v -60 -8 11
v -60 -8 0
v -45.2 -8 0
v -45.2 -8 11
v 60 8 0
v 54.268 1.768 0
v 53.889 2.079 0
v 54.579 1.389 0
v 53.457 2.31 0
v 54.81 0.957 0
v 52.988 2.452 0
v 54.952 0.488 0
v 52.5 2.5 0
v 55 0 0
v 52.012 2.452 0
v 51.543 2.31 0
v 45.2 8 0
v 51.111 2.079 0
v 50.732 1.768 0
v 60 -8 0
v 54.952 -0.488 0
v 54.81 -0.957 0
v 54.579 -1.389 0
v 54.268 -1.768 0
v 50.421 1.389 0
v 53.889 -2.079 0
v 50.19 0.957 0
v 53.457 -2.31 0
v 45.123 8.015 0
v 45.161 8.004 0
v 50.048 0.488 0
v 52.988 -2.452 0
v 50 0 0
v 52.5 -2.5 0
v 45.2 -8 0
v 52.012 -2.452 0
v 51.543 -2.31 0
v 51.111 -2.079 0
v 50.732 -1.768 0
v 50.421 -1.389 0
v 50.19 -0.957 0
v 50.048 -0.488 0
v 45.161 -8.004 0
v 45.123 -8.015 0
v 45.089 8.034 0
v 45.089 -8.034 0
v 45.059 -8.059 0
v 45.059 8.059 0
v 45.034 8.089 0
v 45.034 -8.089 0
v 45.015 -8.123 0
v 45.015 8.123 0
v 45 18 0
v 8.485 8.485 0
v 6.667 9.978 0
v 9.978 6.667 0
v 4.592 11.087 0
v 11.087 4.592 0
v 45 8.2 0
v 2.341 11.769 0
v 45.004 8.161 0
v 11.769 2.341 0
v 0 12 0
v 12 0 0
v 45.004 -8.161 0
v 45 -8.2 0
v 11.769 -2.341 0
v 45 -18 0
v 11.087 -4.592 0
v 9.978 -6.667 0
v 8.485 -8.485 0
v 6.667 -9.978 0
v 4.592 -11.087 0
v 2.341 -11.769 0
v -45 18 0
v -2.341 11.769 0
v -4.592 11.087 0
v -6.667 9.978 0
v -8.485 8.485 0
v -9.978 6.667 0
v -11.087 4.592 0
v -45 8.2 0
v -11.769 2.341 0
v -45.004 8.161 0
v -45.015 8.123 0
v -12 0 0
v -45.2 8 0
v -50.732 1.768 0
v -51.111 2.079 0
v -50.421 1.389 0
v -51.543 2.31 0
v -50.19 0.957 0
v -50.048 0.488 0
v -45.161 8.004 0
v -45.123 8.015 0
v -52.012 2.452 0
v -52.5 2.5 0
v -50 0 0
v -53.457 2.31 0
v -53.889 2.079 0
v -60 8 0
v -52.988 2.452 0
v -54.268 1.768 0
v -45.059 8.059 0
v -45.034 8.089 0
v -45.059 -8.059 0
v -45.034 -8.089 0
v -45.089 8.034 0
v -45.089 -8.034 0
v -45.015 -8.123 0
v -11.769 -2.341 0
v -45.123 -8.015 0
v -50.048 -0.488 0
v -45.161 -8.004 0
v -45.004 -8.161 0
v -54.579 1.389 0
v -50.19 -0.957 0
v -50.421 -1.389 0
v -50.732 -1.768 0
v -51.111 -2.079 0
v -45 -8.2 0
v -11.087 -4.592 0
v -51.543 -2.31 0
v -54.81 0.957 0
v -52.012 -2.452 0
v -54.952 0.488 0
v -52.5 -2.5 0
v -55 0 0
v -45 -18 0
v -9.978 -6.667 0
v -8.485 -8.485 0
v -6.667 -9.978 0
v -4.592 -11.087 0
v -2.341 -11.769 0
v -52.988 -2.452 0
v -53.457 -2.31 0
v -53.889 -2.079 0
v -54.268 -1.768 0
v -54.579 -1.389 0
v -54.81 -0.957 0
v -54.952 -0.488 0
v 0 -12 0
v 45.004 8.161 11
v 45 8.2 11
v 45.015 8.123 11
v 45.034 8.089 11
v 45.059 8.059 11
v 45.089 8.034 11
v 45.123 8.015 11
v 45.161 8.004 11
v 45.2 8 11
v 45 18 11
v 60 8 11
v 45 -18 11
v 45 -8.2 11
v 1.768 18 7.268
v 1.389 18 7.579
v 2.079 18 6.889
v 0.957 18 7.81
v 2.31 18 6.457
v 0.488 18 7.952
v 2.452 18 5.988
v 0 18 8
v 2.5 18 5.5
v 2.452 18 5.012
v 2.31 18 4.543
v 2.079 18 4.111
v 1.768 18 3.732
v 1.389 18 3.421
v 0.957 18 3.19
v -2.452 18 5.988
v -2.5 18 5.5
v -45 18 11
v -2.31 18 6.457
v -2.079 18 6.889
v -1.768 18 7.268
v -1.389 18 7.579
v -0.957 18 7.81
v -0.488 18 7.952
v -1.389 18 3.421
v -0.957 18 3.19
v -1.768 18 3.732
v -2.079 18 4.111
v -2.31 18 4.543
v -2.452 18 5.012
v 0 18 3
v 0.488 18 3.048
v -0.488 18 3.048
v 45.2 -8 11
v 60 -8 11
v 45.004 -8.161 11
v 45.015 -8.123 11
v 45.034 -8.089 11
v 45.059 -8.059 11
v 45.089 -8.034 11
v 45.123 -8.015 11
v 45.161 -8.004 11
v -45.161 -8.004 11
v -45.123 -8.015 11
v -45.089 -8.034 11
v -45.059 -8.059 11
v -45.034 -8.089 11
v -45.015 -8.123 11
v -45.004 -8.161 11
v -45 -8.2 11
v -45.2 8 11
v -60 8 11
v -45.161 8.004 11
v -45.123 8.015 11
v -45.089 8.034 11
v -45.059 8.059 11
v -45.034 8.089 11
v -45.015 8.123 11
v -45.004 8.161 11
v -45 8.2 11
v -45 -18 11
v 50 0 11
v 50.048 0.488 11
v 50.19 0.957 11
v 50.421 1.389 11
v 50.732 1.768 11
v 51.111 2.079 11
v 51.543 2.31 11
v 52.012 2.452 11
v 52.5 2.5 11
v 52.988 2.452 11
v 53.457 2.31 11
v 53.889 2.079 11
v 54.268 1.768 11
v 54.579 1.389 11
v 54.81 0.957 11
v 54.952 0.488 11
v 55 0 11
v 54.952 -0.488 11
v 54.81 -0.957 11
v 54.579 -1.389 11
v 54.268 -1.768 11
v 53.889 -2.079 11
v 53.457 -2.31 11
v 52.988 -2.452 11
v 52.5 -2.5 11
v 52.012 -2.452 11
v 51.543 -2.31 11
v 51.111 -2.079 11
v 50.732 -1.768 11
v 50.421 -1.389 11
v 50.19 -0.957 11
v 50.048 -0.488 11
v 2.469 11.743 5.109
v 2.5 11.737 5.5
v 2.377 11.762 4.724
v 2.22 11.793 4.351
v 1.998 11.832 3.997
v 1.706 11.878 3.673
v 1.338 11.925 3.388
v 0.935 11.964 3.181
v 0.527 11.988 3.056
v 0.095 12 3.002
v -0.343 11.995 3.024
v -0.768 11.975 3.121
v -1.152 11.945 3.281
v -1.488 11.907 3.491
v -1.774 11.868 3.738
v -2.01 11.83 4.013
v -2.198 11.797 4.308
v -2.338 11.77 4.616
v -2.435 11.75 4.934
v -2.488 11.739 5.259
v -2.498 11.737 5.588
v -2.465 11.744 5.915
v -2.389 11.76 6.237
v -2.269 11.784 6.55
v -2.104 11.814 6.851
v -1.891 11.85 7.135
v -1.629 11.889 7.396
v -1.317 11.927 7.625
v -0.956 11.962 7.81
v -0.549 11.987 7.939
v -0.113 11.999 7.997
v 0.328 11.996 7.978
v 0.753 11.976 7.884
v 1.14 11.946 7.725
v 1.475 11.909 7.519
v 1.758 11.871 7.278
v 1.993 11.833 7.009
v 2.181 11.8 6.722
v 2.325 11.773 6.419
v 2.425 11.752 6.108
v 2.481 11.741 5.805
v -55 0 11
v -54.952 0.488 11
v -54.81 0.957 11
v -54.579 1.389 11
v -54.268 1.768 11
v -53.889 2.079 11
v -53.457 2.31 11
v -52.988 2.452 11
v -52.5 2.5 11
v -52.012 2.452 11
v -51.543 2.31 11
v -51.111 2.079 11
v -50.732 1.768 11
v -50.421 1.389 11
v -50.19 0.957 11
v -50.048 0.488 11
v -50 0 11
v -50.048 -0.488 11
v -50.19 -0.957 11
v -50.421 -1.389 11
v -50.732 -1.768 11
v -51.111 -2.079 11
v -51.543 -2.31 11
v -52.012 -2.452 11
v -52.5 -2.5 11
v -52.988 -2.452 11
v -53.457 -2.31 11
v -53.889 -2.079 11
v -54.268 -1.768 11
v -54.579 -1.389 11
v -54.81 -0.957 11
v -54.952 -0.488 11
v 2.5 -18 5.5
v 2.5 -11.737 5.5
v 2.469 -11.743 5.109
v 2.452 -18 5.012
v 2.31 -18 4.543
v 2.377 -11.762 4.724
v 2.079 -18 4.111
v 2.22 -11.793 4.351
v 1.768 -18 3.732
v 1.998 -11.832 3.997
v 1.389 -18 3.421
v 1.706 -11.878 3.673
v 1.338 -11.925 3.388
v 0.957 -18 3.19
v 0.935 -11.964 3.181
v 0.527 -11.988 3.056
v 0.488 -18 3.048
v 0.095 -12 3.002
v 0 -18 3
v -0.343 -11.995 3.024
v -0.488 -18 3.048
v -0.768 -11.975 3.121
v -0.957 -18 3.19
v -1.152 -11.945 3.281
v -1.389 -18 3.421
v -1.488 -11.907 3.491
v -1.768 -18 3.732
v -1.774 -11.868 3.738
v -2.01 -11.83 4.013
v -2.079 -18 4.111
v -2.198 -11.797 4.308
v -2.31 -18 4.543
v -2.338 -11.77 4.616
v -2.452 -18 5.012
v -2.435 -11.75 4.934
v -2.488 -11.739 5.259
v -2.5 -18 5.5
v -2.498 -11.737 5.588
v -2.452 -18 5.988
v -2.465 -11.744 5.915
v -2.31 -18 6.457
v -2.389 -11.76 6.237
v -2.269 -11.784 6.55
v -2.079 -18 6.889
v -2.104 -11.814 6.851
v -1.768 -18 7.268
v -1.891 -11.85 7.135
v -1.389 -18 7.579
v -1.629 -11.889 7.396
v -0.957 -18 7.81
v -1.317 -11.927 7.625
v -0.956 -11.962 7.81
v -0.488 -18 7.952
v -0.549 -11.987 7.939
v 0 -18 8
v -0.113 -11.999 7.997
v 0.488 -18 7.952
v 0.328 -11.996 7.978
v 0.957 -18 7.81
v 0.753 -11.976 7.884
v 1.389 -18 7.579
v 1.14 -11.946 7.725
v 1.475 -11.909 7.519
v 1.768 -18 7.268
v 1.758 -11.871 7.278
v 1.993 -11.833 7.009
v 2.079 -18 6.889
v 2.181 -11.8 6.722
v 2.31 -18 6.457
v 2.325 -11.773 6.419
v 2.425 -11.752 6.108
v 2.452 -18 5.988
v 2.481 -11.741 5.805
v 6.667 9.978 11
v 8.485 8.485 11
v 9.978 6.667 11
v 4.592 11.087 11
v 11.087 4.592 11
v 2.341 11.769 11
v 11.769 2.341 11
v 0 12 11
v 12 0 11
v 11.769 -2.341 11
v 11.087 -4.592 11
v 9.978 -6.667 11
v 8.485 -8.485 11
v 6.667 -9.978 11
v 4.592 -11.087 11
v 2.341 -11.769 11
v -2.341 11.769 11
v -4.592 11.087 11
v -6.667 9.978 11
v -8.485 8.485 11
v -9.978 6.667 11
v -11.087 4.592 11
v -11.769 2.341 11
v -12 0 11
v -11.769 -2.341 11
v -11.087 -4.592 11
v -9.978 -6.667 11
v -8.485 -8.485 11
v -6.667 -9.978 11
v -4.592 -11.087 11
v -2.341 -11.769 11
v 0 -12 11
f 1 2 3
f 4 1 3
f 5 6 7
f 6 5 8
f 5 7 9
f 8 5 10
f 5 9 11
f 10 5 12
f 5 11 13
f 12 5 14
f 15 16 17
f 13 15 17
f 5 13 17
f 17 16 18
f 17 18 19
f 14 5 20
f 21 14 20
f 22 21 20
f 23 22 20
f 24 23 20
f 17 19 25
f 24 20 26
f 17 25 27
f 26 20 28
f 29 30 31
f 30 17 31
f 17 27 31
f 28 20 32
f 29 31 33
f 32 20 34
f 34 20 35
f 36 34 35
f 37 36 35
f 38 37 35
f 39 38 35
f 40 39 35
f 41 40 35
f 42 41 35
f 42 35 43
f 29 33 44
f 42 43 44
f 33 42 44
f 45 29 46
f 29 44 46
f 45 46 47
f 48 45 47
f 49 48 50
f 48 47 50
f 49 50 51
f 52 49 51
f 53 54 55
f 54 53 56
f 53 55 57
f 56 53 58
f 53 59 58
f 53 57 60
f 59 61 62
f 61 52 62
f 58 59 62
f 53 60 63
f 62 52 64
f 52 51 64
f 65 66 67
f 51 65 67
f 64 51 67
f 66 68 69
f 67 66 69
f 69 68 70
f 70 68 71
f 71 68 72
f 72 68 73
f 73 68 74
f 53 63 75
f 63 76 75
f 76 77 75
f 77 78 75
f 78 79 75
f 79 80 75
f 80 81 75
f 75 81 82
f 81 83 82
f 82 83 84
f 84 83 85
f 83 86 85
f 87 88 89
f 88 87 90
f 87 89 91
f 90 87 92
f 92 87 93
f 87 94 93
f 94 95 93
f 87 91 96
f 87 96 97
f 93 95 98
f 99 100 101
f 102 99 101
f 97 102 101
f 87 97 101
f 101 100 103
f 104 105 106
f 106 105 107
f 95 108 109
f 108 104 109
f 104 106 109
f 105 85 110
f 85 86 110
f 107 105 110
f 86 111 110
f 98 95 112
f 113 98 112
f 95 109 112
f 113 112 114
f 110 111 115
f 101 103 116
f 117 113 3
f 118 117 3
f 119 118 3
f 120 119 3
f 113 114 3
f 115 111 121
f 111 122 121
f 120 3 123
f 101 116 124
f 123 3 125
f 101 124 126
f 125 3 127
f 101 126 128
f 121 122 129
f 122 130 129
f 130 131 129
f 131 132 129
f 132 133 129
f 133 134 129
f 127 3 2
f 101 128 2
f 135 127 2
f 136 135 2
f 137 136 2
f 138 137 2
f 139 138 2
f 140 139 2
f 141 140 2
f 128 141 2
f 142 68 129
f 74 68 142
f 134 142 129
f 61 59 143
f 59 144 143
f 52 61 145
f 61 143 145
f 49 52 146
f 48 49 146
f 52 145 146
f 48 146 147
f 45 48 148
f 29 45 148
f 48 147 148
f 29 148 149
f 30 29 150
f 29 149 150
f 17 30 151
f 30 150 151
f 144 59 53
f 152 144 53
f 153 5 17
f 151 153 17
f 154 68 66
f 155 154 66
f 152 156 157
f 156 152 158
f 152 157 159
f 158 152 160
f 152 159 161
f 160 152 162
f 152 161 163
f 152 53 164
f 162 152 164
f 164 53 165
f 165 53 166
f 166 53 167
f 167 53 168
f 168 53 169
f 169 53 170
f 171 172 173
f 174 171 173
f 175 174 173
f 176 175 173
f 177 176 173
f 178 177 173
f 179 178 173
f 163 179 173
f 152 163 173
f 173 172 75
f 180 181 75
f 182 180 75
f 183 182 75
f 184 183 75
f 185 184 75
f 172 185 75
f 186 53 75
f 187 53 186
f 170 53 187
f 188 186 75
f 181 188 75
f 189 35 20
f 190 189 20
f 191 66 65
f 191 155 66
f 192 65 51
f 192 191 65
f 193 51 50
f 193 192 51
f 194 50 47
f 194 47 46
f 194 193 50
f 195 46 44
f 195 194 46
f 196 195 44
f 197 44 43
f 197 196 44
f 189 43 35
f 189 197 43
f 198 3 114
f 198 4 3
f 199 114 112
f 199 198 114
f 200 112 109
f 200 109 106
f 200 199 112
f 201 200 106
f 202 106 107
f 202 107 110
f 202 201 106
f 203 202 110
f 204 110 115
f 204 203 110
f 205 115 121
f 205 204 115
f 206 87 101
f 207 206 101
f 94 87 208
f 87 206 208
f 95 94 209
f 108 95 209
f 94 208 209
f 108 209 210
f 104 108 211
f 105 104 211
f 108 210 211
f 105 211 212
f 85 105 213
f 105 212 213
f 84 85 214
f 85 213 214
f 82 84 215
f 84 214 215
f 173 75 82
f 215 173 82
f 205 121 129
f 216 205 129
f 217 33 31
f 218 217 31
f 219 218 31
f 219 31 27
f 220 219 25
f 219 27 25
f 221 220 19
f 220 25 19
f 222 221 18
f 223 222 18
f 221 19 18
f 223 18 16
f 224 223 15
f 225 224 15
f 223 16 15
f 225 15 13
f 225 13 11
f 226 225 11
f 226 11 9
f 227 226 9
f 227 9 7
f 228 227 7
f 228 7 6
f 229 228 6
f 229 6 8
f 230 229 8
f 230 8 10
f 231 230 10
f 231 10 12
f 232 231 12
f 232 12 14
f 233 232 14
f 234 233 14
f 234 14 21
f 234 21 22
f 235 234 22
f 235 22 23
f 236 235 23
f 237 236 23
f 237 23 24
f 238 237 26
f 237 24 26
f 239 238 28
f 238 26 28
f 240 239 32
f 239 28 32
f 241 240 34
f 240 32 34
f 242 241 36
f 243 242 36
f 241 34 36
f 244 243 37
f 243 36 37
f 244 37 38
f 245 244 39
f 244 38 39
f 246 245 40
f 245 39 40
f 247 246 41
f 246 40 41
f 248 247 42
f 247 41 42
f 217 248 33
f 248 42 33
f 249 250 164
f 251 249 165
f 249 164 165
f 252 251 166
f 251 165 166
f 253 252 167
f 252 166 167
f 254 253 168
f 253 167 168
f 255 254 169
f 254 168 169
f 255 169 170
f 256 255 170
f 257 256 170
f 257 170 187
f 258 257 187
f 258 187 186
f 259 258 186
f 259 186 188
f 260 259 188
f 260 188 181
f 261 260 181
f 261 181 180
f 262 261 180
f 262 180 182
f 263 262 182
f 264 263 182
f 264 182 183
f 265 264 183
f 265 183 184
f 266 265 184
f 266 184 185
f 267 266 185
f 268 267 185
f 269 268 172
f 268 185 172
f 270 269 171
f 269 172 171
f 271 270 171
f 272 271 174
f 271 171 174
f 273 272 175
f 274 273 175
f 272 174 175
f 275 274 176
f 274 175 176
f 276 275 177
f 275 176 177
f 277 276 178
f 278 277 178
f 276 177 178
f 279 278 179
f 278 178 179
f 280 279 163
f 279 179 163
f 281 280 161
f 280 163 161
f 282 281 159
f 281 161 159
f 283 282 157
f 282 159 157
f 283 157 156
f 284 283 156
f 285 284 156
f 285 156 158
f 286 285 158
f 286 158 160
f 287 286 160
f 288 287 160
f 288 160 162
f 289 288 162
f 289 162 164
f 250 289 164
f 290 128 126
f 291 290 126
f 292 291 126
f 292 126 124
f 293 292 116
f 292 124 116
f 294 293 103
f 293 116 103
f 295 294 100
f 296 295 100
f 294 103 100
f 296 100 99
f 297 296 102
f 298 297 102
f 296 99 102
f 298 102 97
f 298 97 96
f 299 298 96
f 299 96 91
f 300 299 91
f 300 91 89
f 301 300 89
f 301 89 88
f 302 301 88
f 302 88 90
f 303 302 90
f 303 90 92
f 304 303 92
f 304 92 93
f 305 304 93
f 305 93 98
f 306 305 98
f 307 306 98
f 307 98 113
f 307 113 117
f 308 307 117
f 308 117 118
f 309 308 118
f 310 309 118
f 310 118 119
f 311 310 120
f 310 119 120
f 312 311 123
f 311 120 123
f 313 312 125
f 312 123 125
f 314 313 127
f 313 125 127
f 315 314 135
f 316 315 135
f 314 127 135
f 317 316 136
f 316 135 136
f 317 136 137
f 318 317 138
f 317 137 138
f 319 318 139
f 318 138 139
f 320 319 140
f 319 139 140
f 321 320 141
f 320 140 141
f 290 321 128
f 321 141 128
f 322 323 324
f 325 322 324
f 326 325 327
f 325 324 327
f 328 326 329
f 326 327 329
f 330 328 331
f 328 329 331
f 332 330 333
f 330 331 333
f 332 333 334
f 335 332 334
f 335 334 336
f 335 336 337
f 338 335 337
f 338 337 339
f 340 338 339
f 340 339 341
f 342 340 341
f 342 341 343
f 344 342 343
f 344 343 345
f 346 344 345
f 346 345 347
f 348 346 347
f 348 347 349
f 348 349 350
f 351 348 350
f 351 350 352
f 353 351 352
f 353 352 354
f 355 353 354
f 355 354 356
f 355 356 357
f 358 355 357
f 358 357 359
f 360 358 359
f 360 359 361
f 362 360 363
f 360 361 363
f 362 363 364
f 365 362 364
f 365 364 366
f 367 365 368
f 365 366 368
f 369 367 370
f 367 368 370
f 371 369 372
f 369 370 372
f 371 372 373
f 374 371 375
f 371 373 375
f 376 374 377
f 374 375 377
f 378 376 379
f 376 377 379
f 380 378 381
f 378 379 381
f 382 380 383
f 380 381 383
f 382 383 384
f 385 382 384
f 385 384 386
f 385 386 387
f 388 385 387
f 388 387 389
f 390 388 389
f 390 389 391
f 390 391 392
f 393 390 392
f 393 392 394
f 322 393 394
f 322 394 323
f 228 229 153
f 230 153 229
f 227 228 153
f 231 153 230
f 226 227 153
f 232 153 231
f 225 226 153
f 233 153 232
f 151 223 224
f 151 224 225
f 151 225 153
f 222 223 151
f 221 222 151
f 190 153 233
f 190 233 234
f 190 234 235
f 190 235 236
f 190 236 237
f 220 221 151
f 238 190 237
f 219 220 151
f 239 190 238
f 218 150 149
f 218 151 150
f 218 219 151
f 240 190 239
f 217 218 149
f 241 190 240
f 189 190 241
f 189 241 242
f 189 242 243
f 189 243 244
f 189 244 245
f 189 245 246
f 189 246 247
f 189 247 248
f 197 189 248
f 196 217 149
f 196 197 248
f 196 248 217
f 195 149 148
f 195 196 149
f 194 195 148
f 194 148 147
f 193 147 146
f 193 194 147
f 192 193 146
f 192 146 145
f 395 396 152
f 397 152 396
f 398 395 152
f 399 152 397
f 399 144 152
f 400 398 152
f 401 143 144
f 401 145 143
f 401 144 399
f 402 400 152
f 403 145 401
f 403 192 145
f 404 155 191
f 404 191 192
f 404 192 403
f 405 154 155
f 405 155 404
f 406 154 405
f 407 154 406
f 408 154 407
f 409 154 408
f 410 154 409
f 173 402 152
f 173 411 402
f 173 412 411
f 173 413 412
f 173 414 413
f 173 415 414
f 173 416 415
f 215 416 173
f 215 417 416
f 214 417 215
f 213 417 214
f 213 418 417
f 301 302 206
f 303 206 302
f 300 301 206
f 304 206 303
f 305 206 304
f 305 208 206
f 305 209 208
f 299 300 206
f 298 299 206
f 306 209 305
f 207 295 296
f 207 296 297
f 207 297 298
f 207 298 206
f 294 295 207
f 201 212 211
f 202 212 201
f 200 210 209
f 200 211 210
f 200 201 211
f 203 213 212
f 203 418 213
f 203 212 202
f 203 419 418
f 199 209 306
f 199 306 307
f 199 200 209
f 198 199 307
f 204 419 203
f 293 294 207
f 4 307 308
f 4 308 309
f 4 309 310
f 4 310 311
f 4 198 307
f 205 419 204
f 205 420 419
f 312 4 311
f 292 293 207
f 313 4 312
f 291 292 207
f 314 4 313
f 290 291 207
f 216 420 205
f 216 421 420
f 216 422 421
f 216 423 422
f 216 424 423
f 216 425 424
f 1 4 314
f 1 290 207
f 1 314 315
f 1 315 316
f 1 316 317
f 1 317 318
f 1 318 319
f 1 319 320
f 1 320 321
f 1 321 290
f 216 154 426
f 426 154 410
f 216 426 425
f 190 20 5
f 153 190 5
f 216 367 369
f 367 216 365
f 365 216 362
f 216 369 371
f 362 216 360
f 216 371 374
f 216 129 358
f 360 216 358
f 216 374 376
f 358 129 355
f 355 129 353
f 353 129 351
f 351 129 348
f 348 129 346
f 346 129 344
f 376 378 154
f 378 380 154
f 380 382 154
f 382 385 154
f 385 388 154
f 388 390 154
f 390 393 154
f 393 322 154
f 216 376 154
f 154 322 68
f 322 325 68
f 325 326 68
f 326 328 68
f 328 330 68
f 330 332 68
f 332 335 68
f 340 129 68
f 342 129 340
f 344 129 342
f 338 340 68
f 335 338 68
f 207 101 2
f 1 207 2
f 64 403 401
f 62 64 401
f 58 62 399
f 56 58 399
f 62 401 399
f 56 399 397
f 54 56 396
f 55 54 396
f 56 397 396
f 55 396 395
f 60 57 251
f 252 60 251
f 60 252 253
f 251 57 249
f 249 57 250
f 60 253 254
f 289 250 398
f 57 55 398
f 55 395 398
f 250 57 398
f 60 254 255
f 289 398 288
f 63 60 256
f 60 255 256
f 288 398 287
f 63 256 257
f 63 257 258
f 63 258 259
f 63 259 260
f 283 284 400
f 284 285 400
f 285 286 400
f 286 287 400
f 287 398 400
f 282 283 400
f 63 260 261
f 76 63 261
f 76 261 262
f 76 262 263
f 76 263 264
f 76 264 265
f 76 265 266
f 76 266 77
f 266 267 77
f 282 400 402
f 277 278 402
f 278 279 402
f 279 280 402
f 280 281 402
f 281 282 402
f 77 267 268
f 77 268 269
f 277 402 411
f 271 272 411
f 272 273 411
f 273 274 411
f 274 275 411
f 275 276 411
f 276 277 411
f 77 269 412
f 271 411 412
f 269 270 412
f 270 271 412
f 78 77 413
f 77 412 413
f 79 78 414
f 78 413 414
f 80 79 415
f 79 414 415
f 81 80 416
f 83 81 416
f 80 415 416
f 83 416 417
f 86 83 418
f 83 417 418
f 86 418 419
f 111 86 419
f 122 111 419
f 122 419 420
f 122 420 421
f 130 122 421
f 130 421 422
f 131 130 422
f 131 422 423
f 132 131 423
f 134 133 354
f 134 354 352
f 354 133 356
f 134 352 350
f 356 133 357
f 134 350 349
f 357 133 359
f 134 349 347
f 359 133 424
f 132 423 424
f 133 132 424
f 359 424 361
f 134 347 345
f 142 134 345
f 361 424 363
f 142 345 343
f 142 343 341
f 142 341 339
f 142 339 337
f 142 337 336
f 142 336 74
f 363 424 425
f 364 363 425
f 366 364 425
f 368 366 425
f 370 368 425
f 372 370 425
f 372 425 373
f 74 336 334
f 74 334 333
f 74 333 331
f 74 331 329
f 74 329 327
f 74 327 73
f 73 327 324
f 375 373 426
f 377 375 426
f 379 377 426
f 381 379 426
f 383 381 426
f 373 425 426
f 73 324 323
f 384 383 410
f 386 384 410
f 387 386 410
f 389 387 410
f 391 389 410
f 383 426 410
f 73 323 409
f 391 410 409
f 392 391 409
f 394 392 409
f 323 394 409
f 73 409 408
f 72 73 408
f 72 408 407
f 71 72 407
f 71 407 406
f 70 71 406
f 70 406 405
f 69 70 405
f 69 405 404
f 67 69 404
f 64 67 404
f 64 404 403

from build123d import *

# Parameters (mm, degrees)
ESTRUSIONE_ESTRUSIONE1_DEPTH = 11
SCHIZZO4_R                   = 12
TAGLIO_ESTRUSIONE1_DEPTH     = 64.600314465
FORO_5_0_5_1_D               = 5
FORO_5_0_5_2_D               = 5
RACCORDO1_R                  = 0.2


with BuildPart() as part:
    # Schizzo2 → Estrusione-Estrusione1 (new body)
    with BuildSketch(Plane(origin=(0, 0, 0), x_dir=(1, 0, 0), z_dir=(0, 0, -1))):
        Polygon((-60, -8), (-60, 8), (-45, 8), (-45, 18), (45, 18), (45, 8), (60, 8), (60, -8), (45, -8), (45, -18), (-45, -18), (-45, -8), align=None)
    extrude(amount=-ESTRUSIONE_ESTRUSIONE1_DEPTH)

    # Schizzo4 → Taglio-Estrusione1 (cut, through all)
    with BuildSketch(Plane.XY.offset(11)):
        Circle(SCHIZZO4_R)
    extrude(amount=-TAGLIO_ESTRUSIONE1_DEPTH, mode=Mode.SUBTRACT)

    # Foro Ø5.0 (5)-1 (through all)
    with Locations(Plane(origin=(0, -18, 0), x_dir=(-1, 0, 0), z_dir=(0, -1, 0))):
        with Locations((0, -5.5)):
            Hole(FORO_5_0_5_1_D / 2)

    # Foro Ø5.0 (5)-2 (through all)
    with Locations(Plane.XY.offset(11)):
        with Locations((-52.5, 0), (52.5, 0)):
            Hole(FORO_5_0_5_2_D / 2)

    # Raccordo1
    raccordo1_edges = [part.edges().sort_by_distance(p)[0] for p in [
        (45, -8, 5.5),
        (45, 8, 5.5),
        (-45, 8, 5.5),
        (-45, -8, 5.5),
    ]]
    fillet(raccordo1_edges, radius=RACCORDO1_R)


solid = part.part
